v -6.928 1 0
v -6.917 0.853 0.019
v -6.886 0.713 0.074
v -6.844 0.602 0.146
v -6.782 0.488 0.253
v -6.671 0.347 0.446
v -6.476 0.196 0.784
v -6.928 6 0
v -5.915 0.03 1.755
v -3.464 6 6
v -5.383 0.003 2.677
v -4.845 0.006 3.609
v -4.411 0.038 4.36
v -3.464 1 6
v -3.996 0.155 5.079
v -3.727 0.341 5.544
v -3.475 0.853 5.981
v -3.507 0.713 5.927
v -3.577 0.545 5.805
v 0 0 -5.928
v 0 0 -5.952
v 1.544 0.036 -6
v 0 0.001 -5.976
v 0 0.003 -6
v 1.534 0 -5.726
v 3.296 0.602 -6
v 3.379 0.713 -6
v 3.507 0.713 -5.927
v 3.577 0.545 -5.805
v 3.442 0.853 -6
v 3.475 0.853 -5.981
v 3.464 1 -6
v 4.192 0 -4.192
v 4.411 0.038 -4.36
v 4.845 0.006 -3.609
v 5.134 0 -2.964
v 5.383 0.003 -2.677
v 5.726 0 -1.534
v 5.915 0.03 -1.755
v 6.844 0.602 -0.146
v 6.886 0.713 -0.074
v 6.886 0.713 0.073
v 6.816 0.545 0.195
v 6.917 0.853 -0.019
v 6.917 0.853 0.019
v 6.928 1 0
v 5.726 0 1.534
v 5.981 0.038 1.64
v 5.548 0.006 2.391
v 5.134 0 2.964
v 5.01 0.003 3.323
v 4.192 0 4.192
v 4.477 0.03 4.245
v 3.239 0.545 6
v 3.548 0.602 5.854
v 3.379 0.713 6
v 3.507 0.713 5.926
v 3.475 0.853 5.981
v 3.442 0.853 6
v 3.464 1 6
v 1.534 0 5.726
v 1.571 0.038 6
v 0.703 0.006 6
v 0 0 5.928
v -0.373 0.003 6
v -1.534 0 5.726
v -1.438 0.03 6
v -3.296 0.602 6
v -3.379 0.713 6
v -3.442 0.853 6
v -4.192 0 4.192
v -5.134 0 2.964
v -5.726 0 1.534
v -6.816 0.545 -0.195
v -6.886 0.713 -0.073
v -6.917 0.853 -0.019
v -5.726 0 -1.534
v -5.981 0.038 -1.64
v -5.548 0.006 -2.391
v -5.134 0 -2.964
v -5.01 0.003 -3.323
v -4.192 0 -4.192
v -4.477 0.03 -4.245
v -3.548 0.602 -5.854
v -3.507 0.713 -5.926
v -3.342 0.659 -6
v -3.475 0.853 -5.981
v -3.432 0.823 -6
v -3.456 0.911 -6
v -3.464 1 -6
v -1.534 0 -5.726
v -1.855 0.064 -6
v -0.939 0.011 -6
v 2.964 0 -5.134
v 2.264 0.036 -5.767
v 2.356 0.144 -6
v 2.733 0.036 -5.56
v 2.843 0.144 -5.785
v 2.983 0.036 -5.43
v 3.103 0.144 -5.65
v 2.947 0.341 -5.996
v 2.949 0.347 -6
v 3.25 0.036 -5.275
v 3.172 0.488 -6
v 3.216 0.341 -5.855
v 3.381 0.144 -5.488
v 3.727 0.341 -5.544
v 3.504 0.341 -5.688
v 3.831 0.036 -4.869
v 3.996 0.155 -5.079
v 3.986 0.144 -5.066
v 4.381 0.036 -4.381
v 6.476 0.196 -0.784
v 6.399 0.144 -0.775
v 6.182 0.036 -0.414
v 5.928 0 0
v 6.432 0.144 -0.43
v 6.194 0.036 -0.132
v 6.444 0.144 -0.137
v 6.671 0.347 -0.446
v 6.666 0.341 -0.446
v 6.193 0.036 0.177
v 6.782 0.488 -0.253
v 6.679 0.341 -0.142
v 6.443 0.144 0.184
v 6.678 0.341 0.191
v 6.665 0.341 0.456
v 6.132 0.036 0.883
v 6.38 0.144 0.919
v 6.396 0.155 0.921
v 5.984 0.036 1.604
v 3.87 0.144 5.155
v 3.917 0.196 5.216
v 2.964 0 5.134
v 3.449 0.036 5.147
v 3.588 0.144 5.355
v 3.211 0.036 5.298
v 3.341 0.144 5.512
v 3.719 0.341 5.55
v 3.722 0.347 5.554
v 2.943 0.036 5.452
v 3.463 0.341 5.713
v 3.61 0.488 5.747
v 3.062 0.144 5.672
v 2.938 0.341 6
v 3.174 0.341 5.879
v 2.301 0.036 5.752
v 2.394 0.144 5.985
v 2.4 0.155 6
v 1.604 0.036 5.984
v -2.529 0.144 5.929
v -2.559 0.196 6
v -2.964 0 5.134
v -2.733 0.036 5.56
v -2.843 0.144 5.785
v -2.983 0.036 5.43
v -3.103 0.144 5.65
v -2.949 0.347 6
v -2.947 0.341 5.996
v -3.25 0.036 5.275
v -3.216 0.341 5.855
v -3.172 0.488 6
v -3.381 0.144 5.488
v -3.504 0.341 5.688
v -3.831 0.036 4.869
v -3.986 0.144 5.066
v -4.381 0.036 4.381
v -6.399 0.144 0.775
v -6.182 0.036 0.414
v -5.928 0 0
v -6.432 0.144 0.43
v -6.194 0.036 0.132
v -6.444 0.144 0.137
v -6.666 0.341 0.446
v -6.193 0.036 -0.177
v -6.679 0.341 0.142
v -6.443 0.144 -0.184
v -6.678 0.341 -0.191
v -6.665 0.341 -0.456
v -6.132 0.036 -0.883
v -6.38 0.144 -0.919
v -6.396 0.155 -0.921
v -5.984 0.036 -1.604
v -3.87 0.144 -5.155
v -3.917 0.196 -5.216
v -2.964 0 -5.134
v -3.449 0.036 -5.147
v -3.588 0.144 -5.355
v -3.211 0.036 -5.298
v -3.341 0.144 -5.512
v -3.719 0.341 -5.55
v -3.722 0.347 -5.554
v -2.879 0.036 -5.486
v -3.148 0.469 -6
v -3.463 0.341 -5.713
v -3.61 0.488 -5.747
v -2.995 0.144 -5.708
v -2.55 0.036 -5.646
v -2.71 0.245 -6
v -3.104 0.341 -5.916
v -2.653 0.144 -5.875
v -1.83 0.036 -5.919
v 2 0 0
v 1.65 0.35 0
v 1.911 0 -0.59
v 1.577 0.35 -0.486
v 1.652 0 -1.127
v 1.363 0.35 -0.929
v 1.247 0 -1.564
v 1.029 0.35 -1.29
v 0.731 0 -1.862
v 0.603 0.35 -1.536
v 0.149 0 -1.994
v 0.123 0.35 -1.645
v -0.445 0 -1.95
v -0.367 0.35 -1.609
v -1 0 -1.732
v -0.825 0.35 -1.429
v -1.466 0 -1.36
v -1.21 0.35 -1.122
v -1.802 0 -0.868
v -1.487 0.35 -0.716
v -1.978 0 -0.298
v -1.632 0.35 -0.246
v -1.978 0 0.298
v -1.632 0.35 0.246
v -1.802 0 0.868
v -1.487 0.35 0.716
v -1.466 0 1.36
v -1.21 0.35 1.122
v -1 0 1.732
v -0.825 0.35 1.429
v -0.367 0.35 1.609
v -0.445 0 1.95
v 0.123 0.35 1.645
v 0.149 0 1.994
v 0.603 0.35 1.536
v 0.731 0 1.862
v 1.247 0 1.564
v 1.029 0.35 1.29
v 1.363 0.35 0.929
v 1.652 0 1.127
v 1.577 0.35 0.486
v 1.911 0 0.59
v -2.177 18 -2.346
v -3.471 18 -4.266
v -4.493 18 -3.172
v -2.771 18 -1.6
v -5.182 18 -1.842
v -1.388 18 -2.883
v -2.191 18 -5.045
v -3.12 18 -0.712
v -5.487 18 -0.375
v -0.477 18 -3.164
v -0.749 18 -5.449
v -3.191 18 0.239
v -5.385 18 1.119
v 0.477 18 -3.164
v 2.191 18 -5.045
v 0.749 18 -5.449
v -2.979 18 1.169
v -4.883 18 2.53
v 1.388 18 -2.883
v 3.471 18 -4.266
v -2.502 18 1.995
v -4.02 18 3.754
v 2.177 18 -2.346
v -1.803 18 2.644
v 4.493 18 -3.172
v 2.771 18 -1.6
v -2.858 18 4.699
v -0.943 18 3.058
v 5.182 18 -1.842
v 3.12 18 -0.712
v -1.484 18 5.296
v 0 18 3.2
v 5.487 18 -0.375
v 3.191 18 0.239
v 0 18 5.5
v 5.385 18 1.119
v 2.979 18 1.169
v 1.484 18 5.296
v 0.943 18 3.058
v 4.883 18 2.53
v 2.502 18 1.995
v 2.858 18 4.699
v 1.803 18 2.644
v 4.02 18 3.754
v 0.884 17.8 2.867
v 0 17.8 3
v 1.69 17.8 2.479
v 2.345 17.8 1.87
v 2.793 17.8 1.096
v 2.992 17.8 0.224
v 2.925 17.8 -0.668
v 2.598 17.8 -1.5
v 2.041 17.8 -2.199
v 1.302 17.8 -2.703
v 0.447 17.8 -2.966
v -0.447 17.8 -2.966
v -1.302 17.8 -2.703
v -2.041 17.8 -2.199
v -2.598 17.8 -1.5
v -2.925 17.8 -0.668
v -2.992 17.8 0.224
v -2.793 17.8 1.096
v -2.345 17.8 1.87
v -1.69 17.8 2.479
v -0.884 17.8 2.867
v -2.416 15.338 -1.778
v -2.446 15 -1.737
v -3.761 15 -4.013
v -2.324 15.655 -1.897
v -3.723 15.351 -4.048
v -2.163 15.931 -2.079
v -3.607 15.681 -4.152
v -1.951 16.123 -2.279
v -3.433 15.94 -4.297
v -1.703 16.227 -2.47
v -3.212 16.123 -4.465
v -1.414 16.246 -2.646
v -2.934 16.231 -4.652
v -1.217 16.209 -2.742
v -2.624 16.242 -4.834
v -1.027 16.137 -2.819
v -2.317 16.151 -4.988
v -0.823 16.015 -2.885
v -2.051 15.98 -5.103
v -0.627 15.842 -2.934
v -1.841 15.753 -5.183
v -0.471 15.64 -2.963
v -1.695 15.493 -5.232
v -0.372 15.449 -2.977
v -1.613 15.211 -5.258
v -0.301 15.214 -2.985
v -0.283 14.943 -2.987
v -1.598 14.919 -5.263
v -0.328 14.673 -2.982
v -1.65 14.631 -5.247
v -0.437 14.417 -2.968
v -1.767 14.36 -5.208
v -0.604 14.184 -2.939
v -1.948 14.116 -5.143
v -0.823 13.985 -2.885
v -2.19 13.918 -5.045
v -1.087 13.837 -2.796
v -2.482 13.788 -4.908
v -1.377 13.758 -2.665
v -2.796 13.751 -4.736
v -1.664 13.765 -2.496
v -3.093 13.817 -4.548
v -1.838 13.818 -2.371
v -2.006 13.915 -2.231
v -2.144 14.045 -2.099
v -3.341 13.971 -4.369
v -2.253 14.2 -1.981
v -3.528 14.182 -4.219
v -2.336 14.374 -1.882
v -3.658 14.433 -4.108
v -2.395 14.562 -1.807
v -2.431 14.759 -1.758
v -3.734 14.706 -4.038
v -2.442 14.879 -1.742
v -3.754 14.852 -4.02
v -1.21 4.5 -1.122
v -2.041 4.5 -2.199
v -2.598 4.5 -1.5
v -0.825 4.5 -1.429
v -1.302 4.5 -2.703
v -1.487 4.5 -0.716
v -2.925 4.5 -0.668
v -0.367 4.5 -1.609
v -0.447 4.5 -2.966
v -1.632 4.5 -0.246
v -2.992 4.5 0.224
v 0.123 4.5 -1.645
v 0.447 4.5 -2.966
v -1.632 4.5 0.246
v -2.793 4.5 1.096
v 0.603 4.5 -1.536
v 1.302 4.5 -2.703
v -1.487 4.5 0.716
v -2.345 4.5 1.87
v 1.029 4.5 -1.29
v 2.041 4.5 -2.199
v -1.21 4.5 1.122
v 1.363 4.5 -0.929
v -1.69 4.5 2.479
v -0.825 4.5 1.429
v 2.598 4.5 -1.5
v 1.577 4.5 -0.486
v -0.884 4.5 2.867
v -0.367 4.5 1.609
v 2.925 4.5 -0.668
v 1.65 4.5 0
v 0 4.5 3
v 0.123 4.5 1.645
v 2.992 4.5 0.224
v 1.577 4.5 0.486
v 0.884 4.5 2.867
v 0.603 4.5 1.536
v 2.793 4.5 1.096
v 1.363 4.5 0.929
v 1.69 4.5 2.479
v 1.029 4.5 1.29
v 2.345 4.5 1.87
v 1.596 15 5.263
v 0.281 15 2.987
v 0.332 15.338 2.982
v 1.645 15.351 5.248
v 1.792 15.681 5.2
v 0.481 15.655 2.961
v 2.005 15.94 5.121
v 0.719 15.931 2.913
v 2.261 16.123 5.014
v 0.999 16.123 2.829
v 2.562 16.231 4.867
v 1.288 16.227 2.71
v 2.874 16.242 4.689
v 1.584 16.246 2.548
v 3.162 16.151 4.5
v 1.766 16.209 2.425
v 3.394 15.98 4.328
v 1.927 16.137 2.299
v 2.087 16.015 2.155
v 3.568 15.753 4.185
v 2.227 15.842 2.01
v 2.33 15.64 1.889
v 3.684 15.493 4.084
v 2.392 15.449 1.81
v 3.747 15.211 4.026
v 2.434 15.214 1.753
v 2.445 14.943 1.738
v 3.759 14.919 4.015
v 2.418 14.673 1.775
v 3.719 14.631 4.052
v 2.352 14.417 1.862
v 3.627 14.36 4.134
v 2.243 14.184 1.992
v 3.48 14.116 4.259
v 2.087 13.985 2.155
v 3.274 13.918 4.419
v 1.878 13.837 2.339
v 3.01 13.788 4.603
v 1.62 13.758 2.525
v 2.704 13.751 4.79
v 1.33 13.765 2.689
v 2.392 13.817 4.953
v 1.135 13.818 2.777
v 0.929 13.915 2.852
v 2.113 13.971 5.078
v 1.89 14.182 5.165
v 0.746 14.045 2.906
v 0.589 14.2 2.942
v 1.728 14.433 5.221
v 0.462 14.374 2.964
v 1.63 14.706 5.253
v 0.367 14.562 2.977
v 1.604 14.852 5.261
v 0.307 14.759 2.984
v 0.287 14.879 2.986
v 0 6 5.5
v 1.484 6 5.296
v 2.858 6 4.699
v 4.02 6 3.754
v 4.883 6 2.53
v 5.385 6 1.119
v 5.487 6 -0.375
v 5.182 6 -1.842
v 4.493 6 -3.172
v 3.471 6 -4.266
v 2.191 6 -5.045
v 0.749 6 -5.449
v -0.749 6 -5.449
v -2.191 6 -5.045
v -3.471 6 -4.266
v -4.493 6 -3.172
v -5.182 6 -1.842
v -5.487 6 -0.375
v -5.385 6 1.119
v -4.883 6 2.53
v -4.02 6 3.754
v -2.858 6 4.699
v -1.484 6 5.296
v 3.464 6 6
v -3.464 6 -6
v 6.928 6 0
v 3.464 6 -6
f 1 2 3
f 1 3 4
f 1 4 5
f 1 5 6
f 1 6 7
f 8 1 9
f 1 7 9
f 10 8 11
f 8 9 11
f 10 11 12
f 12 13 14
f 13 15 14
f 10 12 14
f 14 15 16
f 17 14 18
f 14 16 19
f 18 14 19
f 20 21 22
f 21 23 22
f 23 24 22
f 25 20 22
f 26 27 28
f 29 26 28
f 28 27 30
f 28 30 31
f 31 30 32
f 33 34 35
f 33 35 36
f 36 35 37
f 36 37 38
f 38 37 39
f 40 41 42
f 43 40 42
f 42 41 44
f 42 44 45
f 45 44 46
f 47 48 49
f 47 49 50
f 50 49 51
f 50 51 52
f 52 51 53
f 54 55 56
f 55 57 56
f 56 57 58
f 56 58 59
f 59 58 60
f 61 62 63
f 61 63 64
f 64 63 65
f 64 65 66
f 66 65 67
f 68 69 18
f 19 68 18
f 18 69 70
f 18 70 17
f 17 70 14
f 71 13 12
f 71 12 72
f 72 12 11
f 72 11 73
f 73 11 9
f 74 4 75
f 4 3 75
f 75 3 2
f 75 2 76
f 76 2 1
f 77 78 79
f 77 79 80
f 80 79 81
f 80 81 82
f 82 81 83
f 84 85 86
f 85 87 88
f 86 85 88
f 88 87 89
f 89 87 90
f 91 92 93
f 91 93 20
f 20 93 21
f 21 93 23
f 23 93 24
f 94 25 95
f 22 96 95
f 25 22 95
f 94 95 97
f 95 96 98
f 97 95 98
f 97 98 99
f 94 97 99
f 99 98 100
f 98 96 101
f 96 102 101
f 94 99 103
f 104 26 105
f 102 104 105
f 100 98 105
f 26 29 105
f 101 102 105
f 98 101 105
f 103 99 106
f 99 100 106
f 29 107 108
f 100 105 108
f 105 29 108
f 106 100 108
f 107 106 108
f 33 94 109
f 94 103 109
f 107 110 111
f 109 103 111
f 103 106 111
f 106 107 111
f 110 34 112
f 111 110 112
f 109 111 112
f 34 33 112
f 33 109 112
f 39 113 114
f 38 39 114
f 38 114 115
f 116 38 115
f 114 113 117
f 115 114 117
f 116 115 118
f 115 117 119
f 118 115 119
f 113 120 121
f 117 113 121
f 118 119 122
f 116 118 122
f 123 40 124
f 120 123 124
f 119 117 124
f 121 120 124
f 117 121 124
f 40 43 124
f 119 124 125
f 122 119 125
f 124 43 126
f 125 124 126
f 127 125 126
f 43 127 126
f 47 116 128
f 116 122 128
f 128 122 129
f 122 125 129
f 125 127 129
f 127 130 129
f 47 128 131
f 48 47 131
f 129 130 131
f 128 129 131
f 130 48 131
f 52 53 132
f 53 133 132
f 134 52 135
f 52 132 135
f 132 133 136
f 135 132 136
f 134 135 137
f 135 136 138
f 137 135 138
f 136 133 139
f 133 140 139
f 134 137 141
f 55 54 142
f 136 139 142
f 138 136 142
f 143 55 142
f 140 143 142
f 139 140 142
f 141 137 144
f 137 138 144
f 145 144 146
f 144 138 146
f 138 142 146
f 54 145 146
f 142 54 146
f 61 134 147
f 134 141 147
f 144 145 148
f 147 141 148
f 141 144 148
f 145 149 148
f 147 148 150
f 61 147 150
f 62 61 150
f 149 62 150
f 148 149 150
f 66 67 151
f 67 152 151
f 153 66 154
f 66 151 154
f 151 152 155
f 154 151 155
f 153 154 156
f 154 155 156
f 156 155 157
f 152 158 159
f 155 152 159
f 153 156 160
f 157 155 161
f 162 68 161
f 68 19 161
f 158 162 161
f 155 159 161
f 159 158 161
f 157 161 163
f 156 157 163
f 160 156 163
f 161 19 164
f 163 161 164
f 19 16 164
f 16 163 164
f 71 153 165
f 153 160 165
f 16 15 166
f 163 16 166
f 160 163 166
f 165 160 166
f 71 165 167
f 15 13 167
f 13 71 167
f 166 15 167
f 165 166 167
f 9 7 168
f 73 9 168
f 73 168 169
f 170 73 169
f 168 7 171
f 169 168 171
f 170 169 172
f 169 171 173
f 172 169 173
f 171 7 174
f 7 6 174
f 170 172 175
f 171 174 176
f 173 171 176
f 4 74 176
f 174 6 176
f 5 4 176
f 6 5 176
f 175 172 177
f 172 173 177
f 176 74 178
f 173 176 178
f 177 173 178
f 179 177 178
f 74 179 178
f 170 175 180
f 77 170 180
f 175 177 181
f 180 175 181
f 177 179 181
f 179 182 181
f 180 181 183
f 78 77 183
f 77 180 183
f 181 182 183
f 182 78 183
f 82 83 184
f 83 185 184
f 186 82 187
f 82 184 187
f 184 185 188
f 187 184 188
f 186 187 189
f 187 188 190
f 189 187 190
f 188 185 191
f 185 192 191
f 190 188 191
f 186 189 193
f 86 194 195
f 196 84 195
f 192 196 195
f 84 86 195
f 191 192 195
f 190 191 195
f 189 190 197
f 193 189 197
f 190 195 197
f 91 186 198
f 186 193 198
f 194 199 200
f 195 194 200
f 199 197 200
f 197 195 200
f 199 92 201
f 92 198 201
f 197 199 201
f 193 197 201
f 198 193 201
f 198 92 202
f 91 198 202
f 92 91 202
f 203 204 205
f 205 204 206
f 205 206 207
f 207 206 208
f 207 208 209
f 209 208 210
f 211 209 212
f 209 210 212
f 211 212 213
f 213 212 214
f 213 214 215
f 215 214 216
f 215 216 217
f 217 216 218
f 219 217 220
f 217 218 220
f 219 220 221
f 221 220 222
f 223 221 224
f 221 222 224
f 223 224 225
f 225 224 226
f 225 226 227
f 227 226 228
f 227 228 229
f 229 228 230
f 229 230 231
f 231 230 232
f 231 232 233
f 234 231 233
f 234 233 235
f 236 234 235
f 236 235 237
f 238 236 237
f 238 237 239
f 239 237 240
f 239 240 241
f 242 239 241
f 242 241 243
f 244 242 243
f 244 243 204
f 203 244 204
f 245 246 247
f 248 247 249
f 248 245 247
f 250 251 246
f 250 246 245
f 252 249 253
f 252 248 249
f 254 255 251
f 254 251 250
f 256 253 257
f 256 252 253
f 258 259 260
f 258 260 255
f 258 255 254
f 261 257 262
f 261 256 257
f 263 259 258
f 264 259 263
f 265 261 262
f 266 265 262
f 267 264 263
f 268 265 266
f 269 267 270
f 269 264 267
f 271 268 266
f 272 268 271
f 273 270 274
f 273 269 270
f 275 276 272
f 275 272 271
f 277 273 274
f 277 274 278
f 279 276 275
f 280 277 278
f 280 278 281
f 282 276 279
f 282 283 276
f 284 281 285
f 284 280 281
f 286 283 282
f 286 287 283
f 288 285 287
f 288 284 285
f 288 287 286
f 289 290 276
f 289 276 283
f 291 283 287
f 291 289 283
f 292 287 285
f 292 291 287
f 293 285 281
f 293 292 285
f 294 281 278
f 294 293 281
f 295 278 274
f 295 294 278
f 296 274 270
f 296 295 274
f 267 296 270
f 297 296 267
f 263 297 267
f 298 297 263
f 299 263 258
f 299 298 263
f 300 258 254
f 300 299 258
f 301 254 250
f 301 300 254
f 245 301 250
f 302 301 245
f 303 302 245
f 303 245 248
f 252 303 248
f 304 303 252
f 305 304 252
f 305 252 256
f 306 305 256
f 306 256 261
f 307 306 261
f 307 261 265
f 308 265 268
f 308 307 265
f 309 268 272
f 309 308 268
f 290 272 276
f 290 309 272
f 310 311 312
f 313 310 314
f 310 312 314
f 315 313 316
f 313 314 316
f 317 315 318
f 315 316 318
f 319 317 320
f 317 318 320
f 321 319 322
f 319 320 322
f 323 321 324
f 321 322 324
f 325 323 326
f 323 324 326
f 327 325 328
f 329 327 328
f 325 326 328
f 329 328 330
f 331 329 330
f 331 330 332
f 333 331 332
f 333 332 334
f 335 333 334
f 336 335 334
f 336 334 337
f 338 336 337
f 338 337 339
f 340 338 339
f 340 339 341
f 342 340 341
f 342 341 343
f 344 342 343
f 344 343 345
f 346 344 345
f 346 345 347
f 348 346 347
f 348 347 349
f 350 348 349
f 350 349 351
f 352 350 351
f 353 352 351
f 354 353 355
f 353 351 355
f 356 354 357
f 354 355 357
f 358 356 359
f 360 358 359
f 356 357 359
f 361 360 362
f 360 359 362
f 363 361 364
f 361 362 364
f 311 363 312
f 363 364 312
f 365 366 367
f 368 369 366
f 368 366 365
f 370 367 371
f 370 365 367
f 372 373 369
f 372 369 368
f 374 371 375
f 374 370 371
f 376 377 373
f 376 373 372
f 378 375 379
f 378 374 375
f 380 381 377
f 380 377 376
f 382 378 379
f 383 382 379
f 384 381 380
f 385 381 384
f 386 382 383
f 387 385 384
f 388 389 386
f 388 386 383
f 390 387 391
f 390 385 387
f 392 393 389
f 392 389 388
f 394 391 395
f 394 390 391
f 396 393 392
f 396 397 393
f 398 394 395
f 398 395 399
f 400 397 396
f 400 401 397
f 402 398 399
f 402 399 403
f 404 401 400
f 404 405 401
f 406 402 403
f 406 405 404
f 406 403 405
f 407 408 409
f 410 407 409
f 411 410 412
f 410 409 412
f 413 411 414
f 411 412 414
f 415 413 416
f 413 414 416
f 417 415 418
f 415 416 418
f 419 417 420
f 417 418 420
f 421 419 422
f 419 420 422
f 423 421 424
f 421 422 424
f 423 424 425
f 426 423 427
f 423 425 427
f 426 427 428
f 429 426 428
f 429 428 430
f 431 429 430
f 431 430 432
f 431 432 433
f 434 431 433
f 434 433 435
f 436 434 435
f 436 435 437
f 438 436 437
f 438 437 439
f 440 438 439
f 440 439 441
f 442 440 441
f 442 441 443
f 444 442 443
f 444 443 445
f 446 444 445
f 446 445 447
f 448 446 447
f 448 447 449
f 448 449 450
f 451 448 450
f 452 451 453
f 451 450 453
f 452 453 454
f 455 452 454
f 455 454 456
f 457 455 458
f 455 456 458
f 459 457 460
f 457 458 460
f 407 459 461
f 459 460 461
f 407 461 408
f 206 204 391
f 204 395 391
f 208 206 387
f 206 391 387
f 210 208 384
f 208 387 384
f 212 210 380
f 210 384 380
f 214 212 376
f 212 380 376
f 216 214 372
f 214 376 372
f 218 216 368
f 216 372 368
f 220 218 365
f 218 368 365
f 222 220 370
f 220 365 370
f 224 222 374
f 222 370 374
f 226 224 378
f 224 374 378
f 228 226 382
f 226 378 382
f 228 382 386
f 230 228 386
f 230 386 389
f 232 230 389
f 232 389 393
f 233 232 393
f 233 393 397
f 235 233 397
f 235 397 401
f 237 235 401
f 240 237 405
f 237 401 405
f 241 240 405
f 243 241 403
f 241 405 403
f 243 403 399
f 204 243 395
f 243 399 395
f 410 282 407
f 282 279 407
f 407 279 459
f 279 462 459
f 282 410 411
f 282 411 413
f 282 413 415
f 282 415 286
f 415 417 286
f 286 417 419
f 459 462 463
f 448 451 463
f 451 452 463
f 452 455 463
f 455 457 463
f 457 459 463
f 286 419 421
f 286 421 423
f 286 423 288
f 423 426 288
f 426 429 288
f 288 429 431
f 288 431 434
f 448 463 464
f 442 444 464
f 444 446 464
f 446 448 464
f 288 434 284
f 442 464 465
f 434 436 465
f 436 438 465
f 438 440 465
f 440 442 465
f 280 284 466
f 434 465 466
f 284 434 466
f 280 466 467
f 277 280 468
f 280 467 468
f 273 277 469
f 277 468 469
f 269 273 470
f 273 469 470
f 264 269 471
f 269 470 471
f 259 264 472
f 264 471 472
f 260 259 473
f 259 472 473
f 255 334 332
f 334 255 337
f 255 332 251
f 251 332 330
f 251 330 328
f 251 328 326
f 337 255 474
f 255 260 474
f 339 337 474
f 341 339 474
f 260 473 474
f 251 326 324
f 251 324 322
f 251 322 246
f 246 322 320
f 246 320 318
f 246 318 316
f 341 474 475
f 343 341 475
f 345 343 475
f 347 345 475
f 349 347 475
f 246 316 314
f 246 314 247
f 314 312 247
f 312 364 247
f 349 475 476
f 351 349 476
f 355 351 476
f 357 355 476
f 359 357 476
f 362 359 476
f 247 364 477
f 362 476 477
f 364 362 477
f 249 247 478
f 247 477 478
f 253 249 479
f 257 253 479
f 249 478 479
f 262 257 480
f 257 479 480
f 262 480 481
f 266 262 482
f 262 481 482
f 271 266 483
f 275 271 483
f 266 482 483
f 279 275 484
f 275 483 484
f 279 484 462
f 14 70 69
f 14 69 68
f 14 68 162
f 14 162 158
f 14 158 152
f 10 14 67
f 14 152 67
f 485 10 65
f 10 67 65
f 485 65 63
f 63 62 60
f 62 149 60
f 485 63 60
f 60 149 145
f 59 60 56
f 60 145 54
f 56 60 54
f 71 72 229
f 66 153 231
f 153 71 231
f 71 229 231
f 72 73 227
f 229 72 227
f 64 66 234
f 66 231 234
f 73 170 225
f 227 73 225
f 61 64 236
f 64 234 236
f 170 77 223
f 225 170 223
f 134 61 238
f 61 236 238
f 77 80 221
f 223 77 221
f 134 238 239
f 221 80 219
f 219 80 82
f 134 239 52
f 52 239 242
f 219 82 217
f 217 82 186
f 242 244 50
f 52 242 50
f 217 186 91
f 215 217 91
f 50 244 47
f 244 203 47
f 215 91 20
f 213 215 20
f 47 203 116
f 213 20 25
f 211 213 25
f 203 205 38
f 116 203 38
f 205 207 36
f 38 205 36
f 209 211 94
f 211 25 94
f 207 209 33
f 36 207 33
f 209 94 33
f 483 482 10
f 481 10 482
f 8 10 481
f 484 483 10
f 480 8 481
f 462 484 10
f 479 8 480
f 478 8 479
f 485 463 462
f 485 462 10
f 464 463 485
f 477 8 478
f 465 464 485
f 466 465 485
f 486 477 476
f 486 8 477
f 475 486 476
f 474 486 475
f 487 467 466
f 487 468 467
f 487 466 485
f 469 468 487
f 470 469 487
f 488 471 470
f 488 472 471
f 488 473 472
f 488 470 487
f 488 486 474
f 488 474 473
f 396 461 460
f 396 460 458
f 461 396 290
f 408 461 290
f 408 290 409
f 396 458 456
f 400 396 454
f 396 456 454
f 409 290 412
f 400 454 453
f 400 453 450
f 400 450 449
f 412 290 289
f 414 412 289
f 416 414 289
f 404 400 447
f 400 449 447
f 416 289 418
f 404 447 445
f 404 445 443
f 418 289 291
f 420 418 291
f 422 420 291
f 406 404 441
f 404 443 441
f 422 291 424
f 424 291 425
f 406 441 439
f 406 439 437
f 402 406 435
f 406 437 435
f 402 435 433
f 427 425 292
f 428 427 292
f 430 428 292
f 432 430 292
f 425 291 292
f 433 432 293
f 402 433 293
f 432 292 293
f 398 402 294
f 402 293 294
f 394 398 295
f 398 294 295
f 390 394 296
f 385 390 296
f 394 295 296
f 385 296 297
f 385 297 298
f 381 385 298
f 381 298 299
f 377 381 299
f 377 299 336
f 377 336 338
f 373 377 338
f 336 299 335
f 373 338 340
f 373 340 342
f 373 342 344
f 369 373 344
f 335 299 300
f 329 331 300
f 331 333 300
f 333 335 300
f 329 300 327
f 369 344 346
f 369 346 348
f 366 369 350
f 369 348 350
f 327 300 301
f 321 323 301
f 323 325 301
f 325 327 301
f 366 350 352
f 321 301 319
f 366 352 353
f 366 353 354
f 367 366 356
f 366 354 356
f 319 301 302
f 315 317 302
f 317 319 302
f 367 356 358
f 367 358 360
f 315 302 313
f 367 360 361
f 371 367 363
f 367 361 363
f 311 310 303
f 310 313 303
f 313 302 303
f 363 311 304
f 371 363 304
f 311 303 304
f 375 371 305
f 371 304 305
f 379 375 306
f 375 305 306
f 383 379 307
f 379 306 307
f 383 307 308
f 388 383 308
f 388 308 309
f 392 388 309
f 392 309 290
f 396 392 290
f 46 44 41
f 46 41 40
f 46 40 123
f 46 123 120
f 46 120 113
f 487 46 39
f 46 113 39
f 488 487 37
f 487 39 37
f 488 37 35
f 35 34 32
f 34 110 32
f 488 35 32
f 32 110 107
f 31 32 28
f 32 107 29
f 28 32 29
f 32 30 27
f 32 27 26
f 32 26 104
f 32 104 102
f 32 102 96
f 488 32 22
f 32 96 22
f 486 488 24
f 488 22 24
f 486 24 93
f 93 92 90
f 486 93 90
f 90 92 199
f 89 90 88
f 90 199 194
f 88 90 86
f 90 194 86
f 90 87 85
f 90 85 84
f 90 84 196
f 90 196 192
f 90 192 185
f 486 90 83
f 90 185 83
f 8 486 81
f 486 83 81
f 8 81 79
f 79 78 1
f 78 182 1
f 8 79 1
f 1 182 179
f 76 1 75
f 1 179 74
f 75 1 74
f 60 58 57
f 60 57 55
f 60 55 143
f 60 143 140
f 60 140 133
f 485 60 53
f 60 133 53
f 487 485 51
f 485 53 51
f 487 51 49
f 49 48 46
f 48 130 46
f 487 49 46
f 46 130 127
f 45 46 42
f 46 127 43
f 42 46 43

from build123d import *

# Parameters (mm, degrees)
BASE_DEPTH                      = 6
SKETCH2_R                       = 5.5
SHAFT_HOLDING_BODY_DEPTH        = 12
M4X0_7_TAPPED_HOLE1_D           = 3.3
M4X0_7_TAPPED_HOLE1_CSINK_D     = 4
M4X0_7_TAPPED_HOLE1_CSINK_ANGLE = 90
M3X0_5_TAPPED_HOLE1_D           = 2.5
SKETCH13_R                      = 3
SHAFT_HOLE_DEPTH                = 13.5
SH_C_SIZE                       = 0.2


with BuildPart() as part:
    # Sketch1 → BASE (new body)
    with BuildSketch(Plane(origin=(0, 0, 0), x_dir=(1, 0, 0), z_dir=(0, 1, 0))):
        Polygon((3.464101615, -6), (6.92820323, 0), (3.464101615, 6), (-3.464101615, 6), (-6.92820323, 0), (-3.464101615, -6), align=None)
    extrude(amount=BASE_DEPTH)

    # Sketch2 → SHAFT HOLDING BODY (add)
    with BuildSketch(Plane(origin=(0, 6, 0), x_dir=(1, 0, 0), z_dir=(0, 1, 0))):
        with Locations(Location((0, 0, 0), (0, 0, 270))):
            Circle(SKETCH2_R)
    extrude(amount=SHAFT_HOLDING_BODY_DEPTH)

    # M4x0.7 Tapped Hole1 (through all)
    with Locations(Plane(origin=(0, 0, 0), x_dir=(-1, 0, 0), z_dir=(0, -1, 0))):
        with Locations((0, 0)):
            CounterSinkHole(M4X0_7_TAPPED_HOLE1_D / 2, M4X0_7_TAPPED_HOLE1_CSINK_D / 2, counter_sink_angle=M4X0_7_TAPPED_HOLE1_CSINK_ANGLE)

    # M3x0.5 Tapped Hole1 (through all)
    with Locations(Plane(origin=(2.75, 6, 4.763139721), x_dir=(0.8660254037844385, 0, -0.5000000000000004), z_dir=(0.5000000000000003, 0, 0.8660254037844384))):
        with Locations((0, 9)):
            Hole(M3X0_5_TAPPED_HOLE1_D / 2)

    # Sketch9 → BASE CHAMFER RELIEF (revolve, cut)
    with BuildSketch(Plane.XY, mode=Mode.PRIVATE) as base_chamfer_relief_sk:
        with BuildLine():
            Line((-6.92820323, 1), (-6.92820323, 0))
            Line((-6.92820323, 0), (-5.92820323, 0))
            ThreePointArc((-5.92820323, 0), (-6.635310011, 0.292893219), (-6.92820323, 1))
        make_face()
    revolve(base_chamfer_relief_sk.sketch.rotate(Axis((0, 0, 0), (0, -1, 0)), 90), axis=Axis((0, 0, 0), (0, -1, 0)), mode=Mode.SUBTRACT)

    # Sketch13 → SHAFT HOLE (cut)
    with BuildSketch(Plane(origin=(0, 18, 0), x_dir=(1, 0, 0), z_dir=(0, 1, 0))):
        with Locations(Location((0, 0, 0), (0, 0, 270))):
            Circle(SKETCH13_R)
    extrude(amount=-SHAFT_HOLE_DEPTH, mode=Mode.SUBTRACT)

    # SH C
    sh_c_edges = [part.edges().sort_by_distance(p)[0] for p in [
        (0, 18, -3),
    ]]
    chamfer(sh_c_edges, length=SH_C_SIZE)


solid = part.part
